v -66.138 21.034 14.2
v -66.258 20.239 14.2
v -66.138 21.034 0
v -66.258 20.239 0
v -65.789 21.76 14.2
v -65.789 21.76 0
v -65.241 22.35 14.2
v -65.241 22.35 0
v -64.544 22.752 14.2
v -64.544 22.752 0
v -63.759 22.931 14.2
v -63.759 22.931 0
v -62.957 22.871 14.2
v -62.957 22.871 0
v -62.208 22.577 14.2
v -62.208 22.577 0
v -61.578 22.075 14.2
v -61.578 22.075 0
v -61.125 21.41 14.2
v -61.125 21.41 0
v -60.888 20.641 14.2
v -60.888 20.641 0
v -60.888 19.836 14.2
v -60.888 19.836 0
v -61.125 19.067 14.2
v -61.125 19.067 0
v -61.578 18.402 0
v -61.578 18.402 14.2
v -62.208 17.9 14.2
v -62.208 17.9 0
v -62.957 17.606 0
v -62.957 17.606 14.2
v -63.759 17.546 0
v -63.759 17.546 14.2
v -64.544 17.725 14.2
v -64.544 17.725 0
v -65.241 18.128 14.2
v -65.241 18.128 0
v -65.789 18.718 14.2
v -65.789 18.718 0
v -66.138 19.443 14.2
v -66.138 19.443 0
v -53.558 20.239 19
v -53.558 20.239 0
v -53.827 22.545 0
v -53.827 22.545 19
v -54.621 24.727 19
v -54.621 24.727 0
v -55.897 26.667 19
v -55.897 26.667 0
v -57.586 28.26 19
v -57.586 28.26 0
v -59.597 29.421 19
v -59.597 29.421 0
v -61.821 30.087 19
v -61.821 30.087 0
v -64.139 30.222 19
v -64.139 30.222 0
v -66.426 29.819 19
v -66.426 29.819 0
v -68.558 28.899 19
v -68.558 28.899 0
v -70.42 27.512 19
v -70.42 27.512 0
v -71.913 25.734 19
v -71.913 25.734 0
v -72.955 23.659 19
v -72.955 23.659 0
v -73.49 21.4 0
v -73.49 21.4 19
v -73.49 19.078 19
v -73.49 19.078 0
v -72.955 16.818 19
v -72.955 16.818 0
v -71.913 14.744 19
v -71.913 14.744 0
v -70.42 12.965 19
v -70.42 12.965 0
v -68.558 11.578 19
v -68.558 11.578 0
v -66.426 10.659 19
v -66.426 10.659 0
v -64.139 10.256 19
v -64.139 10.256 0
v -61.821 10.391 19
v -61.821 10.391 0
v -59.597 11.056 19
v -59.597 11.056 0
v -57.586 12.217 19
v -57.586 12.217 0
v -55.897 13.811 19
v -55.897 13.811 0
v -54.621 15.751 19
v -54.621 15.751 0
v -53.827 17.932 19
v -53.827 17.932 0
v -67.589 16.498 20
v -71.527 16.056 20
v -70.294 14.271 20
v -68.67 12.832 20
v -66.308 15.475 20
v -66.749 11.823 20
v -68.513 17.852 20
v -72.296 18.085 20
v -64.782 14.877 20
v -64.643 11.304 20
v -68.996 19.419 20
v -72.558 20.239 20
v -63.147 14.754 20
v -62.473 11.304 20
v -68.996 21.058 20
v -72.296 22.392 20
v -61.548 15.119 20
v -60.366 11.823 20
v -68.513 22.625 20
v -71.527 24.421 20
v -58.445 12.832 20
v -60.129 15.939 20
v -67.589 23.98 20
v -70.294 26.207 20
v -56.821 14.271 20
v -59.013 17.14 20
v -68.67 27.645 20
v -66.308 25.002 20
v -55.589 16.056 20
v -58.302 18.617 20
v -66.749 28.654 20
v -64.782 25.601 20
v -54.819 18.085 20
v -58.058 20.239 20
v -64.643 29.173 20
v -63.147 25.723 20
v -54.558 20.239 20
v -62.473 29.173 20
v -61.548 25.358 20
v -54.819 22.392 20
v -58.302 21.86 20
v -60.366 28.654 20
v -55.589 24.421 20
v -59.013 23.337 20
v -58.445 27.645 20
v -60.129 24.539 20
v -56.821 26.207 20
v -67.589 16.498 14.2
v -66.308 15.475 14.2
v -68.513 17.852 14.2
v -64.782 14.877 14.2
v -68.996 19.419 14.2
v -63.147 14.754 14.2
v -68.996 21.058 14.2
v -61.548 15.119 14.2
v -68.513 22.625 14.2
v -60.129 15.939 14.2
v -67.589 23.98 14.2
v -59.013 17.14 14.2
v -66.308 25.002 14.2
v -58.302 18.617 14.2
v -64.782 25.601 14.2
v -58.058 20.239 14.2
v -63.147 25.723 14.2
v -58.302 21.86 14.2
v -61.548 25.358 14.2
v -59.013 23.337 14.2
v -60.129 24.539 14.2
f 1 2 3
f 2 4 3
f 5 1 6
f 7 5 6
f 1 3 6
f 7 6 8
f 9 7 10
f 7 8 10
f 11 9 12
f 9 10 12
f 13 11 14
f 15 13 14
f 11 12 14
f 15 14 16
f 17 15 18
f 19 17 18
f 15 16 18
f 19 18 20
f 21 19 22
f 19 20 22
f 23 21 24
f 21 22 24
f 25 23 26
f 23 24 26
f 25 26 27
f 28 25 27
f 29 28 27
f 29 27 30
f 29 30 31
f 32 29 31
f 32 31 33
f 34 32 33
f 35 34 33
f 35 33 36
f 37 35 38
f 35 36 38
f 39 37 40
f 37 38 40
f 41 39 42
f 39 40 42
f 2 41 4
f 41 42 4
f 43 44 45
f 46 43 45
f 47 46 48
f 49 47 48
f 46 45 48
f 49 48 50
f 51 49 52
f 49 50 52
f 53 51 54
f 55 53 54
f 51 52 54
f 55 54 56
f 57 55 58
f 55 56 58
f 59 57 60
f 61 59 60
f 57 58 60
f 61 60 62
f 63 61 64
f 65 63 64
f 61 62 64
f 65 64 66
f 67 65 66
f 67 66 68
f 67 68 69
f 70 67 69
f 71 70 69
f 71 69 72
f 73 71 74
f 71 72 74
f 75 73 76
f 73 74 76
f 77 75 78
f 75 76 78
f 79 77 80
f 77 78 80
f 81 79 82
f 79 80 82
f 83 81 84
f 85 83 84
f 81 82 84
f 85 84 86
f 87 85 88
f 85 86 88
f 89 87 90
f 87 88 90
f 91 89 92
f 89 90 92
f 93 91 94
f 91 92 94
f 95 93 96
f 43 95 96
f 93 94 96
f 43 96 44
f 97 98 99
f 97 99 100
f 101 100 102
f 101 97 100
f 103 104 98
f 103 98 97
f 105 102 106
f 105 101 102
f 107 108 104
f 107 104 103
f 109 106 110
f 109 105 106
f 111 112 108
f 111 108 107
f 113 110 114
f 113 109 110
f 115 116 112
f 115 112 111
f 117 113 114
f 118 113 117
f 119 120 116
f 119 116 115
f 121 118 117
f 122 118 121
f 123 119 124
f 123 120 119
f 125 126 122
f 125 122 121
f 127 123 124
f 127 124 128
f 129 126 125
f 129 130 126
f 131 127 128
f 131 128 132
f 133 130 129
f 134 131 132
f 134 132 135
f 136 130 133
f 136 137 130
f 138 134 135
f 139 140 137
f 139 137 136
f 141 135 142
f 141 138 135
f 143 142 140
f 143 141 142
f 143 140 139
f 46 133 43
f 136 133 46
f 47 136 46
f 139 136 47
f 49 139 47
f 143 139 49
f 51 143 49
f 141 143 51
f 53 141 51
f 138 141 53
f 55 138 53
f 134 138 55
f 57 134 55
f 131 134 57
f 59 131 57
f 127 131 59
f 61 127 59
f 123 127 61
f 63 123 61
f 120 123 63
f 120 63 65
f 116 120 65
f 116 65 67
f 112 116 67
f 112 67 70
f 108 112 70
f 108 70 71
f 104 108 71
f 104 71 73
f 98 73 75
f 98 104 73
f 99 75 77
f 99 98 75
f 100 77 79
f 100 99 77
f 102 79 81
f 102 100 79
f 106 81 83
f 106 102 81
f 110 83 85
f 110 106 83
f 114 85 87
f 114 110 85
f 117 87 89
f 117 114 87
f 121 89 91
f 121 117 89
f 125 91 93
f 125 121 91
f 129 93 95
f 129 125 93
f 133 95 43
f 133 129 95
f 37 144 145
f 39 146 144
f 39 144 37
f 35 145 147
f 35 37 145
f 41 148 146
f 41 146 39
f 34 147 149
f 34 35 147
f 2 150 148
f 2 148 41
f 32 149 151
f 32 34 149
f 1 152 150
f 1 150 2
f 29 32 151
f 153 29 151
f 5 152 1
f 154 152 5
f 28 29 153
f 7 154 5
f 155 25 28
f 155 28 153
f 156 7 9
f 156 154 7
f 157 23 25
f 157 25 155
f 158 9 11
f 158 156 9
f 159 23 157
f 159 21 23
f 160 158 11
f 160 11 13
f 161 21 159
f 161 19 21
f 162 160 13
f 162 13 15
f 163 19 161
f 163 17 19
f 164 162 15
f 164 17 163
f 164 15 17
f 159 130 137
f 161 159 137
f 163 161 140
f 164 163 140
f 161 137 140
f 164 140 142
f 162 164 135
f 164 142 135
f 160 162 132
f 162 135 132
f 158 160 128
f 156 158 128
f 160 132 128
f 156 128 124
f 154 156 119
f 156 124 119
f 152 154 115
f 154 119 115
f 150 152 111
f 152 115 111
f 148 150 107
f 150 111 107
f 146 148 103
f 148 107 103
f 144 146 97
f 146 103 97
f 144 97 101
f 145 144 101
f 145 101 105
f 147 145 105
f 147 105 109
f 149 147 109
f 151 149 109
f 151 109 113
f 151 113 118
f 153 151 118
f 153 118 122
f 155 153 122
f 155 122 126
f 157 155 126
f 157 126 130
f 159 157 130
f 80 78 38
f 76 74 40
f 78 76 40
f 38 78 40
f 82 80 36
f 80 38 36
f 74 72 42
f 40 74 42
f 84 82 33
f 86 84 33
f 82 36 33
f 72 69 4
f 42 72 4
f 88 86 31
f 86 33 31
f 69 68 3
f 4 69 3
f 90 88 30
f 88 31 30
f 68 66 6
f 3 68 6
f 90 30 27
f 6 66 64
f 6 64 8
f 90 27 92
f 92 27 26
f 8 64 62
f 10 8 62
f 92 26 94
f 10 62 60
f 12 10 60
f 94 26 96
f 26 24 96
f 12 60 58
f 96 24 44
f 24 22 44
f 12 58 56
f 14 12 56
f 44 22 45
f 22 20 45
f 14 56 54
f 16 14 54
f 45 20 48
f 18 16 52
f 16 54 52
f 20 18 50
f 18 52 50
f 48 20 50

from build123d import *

# Parameters (mm, degrees)
F0_R           = 10
F1_DEPTH       = 20
F2_SIZE        = 1
F4_D           = 5.4
F4_CBORE_D     = 11
F4_CBORE_DEPTH = 5.8


with BuildPart() as f1:
    # F0 (on Top) → F1 (new body)
    with BuildSketch(Plane.XY):
        with Locations((-63.557699, 20.238634)):
            Circle(F0_R)
    extrude(amount=F1_DEPTH)

    # F2
    f2_edges = [f1.edges().sort_by_distance(p)[0] for p in [
        (-73.557699, 20.238634, 20),
    ]]
    chamfer(f2_edges, length=F2_SIZE)

    # F4 (through all)
    with Locations(Plane.XY.offset(20)):
        with Locations((-63.557699, 20.238634)):
            CounterBoreHole(F4_D / 2, F4_CBORE_D / 2, F4_CBORE_DEPTH)


solid = f1.part
